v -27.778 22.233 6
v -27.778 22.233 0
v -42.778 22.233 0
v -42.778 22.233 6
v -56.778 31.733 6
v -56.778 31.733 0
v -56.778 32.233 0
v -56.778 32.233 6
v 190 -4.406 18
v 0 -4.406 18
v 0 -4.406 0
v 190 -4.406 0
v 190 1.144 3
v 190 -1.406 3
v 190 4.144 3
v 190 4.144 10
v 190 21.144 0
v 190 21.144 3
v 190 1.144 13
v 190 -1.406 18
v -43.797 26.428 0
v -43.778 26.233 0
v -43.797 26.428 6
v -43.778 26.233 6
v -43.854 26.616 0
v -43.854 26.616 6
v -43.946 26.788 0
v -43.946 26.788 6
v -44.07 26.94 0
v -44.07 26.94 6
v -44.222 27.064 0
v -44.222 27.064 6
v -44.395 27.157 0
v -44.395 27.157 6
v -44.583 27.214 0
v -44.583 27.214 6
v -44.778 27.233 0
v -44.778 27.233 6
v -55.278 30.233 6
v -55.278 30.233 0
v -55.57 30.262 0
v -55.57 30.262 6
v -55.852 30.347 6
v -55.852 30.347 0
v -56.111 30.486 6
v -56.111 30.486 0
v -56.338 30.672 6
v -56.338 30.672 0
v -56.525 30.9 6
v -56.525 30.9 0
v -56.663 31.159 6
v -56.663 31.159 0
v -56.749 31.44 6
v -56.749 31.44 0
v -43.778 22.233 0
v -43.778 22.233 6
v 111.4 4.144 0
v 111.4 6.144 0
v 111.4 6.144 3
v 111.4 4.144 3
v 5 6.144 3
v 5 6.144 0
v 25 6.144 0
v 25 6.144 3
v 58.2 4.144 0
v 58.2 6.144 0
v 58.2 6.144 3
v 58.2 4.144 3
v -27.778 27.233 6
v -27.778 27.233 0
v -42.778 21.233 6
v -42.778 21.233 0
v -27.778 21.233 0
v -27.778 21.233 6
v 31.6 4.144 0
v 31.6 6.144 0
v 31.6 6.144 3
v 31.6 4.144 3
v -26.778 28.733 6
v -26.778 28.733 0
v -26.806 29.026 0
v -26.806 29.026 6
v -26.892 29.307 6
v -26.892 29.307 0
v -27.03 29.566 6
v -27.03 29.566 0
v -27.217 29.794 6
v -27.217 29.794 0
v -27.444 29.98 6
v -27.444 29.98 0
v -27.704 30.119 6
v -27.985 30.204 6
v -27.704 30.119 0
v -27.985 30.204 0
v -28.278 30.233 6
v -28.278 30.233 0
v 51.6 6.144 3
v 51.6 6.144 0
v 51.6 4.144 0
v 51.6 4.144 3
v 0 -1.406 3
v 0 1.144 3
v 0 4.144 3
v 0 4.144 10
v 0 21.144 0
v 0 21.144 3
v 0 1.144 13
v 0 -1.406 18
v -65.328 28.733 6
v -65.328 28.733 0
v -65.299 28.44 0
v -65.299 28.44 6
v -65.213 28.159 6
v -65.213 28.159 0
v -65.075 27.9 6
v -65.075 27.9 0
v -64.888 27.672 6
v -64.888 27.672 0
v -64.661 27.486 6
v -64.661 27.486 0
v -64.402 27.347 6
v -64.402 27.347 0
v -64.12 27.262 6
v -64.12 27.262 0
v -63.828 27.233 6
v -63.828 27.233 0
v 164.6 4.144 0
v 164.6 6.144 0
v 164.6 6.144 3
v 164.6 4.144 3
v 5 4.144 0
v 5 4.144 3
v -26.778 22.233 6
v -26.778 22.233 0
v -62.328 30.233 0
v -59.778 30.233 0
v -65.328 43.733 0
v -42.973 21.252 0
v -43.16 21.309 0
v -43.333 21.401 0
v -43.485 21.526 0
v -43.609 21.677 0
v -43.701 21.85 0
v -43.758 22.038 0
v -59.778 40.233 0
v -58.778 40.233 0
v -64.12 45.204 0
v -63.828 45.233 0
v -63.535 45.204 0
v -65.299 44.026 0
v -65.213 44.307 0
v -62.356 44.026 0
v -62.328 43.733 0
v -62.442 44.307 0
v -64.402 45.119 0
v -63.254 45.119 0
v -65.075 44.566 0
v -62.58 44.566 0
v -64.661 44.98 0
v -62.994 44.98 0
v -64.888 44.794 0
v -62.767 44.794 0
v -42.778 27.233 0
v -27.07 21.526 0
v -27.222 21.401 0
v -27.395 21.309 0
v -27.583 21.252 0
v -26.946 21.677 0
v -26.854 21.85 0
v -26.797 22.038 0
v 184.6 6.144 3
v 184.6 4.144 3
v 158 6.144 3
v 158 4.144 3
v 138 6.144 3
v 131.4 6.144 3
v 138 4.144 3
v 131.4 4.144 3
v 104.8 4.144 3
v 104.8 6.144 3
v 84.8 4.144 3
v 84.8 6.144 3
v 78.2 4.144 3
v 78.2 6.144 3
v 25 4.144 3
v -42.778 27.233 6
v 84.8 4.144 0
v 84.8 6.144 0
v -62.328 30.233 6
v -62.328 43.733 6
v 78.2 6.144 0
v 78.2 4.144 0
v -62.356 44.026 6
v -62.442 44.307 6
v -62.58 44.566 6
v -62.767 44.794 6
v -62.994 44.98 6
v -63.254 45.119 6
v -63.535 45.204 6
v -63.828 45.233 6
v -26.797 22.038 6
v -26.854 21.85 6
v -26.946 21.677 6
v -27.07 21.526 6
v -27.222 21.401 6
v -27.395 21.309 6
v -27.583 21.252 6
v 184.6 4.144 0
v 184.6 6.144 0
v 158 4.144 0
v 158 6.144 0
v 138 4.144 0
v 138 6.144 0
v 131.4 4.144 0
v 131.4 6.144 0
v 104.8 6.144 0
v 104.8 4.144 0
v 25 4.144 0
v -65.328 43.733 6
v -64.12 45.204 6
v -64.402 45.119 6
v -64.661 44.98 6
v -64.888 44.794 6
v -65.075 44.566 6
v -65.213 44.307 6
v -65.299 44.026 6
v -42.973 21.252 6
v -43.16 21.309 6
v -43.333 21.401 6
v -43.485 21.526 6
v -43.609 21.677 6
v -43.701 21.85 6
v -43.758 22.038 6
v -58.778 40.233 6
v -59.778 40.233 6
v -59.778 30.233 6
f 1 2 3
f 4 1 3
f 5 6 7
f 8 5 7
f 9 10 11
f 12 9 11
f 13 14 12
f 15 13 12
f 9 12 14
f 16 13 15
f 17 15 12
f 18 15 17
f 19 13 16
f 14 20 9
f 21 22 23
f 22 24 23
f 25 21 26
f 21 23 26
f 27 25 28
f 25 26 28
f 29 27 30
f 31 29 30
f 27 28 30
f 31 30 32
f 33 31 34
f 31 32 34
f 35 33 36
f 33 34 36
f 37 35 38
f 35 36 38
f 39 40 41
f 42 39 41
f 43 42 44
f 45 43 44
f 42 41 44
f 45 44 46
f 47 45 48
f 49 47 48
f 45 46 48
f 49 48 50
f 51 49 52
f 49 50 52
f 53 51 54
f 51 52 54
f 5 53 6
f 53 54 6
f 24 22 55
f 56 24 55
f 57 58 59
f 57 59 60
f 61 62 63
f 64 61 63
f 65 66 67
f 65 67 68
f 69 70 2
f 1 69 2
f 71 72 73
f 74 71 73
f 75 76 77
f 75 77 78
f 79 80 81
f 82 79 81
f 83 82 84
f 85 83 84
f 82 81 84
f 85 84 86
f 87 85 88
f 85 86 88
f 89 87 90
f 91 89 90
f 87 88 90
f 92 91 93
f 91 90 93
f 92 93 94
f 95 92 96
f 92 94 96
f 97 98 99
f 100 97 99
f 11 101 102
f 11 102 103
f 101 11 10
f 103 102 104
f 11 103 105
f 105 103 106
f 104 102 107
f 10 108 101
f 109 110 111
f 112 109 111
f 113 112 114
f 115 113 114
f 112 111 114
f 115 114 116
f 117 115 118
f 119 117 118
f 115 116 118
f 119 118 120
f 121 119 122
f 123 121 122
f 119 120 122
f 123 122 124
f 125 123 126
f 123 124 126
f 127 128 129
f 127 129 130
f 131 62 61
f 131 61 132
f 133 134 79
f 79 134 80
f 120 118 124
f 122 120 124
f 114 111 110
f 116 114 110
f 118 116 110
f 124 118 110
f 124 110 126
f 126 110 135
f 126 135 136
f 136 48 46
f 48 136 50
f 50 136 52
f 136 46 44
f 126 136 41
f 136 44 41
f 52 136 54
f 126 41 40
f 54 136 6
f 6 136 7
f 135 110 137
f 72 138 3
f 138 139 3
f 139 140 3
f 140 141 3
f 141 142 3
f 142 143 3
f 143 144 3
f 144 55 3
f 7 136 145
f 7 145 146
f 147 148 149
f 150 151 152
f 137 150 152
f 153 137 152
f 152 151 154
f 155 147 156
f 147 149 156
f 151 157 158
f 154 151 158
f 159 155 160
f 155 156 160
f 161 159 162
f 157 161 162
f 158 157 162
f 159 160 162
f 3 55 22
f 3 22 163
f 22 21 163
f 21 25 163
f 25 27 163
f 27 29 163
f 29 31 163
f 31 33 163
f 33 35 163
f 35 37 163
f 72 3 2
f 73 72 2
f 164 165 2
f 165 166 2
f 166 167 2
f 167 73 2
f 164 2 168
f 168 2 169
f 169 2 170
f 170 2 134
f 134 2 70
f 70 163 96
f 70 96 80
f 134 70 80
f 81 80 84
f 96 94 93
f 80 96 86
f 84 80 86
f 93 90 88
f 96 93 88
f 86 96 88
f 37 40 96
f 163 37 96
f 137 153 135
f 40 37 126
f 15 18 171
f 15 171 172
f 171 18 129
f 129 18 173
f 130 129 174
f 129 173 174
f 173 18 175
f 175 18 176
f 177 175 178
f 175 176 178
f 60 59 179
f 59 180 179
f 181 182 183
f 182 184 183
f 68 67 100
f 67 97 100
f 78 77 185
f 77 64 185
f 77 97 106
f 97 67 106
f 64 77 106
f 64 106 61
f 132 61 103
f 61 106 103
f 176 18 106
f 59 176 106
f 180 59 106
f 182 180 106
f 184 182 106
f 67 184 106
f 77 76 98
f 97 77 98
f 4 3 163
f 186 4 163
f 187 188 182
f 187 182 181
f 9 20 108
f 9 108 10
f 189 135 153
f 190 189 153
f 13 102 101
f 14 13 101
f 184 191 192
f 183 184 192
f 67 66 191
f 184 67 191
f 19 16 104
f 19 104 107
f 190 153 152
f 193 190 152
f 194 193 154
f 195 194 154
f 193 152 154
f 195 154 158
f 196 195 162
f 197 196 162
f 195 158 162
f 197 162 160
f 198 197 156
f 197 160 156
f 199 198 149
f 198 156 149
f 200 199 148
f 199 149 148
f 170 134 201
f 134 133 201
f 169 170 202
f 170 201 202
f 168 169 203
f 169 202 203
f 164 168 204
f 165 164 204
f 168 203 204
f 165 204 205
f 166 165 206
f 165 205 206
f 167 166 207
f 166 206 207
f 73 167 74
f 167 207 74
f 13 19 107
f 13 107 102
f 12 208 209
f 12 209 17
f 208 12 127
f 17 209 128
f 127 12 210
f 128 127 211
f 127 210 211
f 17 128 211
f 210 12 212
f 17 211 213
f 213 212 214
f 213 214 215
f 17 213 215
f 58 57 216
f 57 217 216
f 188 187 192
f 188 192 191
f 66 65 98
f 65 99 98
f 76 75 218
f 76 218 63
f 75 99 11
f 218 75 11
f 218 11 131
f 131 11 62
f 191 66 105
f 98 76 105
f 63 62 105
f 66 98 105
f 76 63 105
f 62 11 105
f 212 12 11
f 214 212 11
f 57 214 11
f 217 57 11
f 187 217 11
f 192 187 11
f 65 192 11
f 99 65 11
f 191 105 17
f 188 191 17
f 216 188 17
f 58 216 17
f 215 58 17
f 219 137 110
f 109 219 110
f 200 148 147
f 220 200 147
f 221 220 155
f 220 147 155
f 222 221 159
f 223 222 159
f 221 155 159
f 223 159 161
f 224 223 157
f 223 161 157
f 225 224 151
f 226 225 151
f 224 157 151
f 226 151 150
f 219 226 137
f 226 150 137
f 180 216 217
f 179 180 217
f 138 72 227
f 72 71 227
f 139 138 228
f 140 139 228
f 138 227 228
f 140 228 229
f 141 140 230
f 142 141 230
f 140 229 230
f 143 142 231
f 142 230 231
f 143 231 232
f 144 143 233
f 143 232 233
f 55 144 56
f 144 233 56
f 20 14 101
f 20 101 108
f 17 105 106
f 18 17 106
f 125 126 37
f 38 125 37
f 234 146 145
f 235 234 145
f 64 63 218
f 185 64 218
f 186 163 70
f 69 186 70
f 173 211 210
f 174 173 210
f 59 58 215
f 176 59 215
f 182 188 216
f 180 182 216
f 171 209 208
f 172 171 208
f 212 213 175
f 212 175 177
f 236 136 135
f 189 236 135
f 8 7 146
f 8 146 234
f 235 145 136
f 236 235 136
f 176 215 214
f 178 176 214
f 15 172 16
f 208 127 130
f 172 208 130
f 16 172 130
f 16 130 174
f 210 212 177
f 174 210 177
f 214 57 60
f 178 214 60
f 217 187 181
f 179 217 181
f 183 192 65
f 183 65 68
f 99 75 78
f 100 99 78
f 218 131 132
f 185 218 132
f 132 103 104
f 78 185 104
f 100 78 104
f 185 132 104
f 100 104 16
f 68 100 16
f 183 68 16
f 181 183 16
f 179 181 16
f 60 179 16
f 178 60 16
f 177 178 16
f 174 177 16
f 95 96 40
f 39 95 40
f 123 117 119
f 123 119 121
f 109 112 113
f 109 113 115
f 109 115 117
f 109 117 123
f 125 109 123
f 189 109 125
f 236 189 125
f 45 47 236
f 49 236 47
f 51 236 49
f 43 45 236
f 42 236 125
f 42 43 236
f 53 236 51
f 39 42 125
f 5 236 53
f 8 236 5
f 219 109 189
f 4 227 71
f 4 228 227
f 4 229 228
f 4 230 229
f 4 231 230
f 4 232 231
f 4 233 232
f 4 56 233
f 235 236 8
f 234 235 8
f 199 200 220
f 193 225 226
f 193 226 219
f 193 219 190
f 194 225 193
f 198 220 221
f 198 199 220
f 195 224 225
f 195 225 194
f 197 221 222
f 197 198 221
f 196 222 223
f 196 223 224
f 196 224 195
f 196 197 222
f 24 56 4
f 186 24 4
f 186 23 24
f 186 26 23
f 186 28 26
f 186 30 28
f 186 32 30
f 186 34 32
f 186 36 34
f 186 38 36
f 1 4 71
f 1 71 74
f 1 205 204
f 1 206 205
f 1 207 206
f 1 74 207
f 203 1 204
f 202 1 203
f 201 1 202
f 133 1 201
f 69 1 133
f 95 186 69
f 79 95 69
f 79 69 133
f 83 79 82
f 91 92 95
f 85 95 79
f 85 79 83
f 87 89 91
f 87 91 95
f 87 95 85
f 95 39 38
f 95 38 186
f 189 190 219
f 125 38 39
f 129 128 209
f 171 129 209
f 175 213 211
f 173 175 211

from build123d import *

# Parameters (mm, degrees)
F1_DEPTH = 190
F2_W     = 20
F2_H     = 2
F3_DEPTH = 25
F5_DEPTH = 6
F6_SIZE2 = 8
F6_SIZE  = 2
F7_R     = 1


with BuildPart() as f1:
    # F0 (on Right) → F1 (new body)
    with BuildSketch(Plane.YZ):
        Polygon((4.144212, 10), (1.144212, 13), (1.144212, 3), (-1.405788, 3), (-1.405788, 18), (-4.405788, 18), (-4.405788, 0), (-2.420145, 0), (21.144212, 0), (21.144212, 3), (4.144212, 3), align=None)
    extrude(amount=F1_DEPTH)

    # F2 (on face) → F3 (cut)
    with BuildSketch(Plane(origin=(0, 0, 0), x_dir=(1, 0, 0), z_dir=(0, 0, -1))):
        with Locations((174.6, -5.144212)):
            Rectangle(F2_W, F2_H)
        with Locations((148, -5.144212)):
            Rectangle(F2_W, F2_H)
        with Locations((121.4, -5.144212)):
            Rectangle(F2_W, F2_H)
        with Locations((94.8, -5.144212)):
            Rectangle(F2_W, F2_H)
        with Locations((68.2, -5.144212)):
            Rectangle(F2_W, F2_H)
        with Locations((41.6, -5.144212)):
            Rectangle(F2_W, F2_H)
        with Locations((15, -5.144212)):
            Rectangle(F2_W, F2_H)
    extrude(amount=-F3_DEPTH, mode=Mode.SUBTRACT)


with BuildPart() as f5:
    # F4 (on Top) → F5 (new body)
    with BuildSketch(Plane.XY):
        with BuildLine():
            Line((-56.777601, 40.232927), (-59.777601, 40.232927))
            Line((-59.777601, 40.232927), (-59.777601, 30.232927))
            Line((-59.777601, 30.232927), (-62.327601, 30.232927))
            Line((-62.327601, 30.232927), (-62.327601, 43.732927))
            ThreePointArc((-62.327601, 43.732927), (-62.766941, 44.793587), (-63.827601, 45.232927))
            ThreePointArc((-63.827601, 45.232927), (-64.888261, 44.793587), (-65.327601, 43.732927))
            Line((-65.327601, 43.732927), (-65.327601, 28.732927))
            ThreePointArc((-65.327601, 28.732927), (-64.888261, 27.672267), (-63.827601, 27.232927))
            Line((-63.827601, 27.232927), (-50.341958, 27.232927))
            Line((-50.341958, 27.232927), (-43.777601, 27.232927))
            Line((-43.777601, 27.232927), (-42.777601, 27.232927))
            Line((-42.777601, 27.232927), (-27.777601, 27.232927))
            Line((-27.777601, 27.232927), (-26.777601, 27.232927))
            Line((-26.777601, 27.232927), (-26.777601, 28.732927))
            ThreePointArc((-26.777601, 28.732927), (-27.216941, 29.793587), (-28.277601, 30.232927))
            Line((-28.277601, 30.232927), (-55.277601, 30.232927))
            ThreePointArc((-55.277601, 30.232927), (-56.338261, 30.672267), (-56.777601, 31.732927))
            Line((-56.777601, 31.732927), (-56.777601, 40.232927))
        make_face()
        Polygon((-26.777601, 21.232927), (-26.777601, 27.232927), (-27.777601, 27.232927), (-27.777601, 22.232927), (-42.777601, 22.232927), (-42.777601, 27.232927), (-43.777601, 27.232927), (-43.777601, 21.232927), align=None)
    extrude(amount=F5_DEPTH)

    # F6
    f6_edges = [f5.edges().sort_by_distance(p)[0] for p in [
        (-56.777601, 40.232927, 3),
    ]]
    chamfer(f6_edges, length=F6_SIZE, length2=F6_SIZE2)

    # F7
    f7_edges = [f5.edges().sort_by_distance(p)[0] for p in [
        (-43.777601, 27.232927, 3),
        (-43.777601, 21.232927, 3),
        (-26.777601, 21.232927, 3),
    ]]
    fillet(f7_edges, radius=F7_R)


solid = Compound([f1.part, f5.part])
